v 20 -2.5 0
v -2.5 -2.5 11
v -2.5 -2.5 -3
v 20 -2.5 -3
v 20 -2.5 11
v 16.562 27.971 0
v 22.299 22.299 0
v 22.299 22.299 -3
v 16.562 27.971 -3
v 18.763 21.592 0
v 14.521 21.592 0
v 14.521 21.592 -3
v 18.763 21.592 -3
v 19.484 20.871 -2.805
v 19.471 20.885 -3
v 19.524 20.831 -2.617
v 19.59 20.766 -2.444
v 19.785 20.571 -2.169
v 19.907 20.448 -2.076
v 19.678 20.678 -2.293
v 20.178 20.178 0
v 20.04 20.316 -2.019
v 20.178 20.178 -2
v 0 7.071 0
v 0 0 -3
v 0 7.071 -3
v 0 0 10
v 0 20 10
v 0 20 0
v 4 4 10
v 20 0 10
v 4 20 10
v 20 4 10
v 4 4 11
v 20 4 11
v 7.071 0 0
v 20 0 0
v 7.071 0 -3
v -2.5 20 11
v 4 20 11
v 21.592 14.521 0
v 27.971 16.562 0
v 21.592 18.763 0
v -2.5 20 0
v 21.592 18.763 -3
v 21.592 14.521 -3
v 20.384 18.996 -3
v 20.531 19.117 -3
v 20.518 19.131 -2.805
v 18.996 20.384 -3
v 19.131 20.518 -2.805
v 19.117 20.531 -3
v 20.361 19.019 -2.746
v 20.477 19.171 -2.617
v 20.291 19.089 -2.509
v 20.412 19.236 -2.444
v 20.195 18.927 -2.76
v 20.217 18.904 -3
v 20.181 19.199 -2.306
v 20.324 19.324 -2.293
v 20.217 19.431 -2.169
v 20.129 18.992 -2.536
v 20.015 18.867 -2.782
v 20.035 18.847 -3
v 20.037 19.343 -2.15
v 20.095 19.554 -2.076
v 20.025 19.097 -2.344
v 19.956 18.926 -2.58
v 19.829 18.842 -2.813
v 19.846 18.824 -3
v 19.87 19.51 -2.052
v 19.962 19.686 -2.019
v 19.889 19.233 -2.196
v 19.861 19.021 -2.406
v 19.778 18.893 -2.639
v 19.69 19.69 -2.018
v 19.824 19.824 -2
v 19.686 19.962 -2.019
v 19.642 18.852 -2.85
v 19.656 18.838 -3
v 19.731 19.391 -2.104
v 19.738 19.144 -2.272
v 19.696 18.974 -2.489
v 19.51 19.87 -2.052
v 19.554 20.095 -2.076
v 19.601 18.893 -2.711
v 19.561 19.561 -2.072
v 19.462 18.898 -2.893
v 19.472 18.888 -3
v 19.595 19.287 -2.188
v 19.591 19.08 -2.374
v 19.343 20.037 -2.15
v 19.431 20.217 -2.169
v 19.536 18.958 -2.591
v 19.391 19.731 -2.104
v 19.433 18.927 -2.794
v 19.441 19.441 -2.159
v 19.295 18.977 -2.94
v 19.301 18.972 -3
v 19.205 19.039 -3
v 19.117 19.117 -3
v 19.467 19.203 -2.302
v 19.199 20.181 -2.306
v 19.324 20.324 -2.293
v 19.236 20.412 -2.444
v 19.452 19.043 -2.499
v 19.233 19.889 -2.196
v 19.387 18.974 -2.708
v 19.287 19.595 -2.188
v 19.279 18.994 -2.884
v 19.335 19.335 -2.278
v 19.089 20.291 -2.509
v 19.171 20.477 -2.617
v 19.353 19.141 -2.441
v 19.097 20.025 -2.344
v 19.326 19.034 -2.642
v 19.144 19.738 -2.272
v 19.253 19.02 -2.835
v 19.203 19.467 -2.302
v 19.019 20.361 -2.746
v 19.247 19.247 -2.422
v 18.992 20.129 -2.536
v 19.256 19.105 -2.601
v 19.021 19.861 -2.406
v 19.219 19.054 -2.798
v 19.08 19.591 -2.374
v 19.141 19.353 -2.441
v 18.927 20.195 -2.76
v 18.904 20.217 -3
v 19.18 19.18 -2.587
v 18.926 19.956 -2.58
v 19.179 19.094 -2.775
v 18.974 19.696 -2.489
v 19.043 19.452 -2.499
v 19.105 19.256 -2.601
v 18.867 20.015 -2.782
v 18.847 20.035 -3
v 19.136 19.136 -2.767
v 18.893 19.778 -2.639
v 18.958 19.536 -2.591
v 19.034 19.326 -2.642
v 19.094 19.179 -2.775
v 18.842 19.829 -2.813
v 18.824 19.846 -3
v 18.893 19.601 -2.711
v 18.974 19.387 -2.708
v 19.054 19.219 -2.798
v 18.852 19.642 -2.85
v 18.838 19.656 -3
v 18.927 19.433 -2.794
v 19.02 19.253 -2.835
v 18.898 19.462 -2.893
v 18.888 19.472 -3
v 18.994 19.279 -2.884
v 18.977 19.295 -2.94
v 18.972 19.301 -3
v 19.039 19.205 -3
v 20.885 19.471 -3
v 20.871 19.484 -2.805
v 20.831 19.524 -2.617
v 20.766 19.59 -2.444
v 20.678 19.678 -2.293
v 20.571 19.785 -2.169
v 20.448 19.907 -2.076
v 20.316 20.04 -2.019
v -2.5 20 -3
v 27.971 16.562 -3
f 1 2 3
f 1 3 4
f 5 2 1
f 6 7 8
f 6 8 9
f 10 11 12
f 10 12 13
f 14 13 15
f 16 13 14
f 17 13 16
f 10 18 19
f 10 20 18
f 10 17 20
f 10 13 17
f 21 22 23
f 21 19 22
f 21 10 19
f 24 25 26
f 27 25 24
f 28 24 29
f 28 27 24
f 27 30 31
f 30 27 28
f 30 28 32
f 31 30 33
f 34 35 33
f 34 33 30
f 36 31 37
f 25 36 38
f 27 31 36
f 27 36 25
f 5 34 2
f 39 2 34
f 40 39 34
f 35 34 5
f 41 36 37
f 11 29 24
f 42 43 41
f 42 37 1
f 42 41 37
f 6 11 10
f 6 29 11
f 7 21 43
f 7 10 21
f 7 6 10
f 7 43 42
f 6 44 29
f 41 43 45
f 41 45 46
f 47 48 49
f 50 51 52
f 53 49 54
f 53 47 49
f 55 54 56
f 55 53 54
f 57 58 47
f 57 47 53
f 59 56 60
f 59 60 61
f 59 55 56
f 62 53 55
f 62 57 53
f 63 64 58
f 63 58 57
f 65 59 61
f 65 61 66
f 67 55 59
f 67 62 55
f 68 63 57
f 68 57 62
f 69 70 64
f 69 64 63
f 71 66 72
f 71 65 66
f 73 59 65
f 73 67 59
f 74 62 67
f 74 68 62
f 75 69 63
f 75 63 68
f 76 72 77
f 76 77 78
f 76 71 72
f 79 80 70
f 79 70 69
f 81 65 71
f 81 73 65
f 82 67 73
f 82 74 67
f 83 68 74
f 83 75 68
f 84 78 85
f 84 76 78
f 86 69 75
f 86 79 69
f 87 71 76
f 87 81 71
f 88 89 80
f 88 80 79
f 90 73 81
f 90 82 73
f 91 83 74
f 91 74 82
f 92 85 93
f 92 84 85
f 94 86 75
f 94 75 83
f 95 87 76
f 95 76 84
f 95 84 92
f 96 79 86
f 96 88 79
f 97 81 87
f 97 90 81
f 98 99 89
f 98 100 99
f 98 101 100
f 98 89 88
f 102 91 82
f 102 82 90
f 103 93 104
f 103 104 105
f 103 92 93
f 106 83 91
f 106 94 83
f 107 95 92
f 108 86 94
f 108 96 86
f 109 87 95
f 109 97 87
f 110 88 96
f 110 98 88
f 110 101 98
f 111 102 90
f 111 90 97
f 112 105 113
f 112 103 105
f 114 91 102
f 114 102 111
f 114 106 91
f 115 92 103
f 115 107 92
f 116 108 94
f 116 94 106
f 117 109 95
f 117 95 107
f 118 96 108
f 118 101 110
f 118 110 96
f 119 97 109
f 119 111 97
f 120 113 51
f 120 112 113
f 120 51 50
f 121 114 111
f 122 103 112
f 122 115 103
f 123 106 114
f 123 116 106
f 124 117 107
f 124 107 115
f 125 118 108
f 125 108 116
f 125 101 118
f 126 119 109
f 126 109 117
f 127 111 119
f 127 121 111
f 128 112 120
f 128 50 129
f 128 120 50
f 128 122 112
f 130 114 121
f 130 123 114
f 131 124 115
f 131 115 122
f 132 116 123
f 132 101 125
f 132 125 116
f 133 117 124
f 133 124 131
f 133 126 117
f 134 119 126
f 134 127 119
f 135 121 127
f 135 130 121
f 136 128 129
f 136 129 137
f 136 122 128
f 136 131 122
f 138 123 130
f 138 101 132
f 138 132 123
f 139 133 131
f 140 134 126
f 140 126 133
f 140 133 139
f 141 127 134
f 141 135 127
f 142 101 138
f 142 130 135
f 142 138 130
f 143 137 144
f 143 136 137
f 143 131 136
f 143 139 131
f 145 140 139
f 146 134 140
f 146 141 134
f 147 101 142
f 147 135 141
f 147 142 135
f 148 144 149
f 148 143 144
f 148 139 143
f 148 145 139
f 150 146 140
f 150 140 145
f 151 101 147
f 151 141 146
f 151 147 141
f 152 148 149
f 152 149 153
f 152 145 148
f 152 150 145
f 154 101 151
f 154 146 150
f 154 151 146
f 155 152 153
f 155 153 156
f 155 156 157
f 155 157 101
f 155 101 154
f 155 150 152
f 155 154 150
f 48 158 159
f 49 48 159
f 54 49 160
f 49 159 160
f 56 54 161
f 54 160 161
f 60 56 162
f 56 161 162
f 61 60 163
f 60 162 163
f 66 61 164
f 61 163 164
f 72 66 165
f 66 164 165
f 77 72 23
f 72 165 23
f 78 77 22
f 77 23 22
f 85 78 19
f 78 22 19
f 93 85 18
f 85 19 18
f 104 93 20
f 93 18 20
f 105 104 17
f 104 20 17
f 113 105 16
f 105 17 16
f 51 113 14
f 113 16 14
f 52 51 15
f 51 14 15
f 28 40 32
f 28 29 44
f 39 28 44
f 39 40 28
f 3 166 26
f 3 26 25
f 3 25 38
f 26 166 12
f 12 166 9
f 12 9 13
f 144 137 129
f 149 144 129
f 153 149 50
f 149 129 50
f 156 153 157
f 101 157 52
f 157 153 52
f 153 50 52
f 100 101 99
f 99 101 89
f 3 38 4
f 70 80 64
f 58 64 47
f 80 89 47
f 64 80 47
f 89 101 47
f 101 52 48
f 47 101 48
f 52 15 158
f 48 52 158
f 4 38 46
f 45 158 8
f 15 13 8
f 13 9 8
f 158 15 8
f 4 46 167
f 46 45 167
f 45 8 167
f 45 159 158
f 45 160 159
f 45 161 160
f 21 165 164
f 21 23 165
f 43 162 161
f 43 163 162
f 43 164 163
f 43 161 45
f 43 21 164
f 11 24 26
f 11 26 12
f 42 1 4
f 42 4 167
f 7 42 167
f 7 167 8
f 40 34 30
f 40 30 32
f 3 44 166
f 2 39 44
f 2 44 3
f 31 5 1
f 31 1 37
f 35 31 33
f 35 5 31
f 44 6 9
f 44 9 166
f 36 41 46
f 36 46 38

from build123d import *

# Parameters (mm, degrees)
F2_DEPTH  = 7
F4_DEPTH  = 3
F5_DEPTH  = 7
F7_DEPTH  = 1.5
F8_R      = 0.99999
F10_DEPTH = 1


# Not quite as in the source:
# - a fillet or chamfer is up to 0.001 mm smaller than in the source, because OpenCascade refuses the exact size


with BuildPart() as f2:
    # F1 (on offset) → F2 (new body)
    with BuildSketch(Plane.XY.offset(4)):
        Polygon((20, 0), (0, 0), (0, 20), (-2.5, 20), (-2.5, -2.5), (20, -2.5), align=None)
    extrude(amount=F2_DEPTH)



with BuildPart() as f4:
    # F3 (on Top) → F4 (new body)
    with BuildSketch(Plane.XY):
        Polygon((21.591883092, 18.7634559673), (21.591883092, 14.5208152802), (4.5710678119, -2.5), (8.75, -2.5), (20, -2.5), (27.9713179916, 16.5624991059), (22.2989825486, 22.2989889792), (16.5624926754, 27.9713244222), (-2.5, 20), (-2.5, 8.75), (-2.5, 4.5710678119), (14.5208152802, 21.591883092), (18.7634559673, 21.591883092), (20.1776695297, 20.1776695297), align=None)
    extrude(amount=-F4_DEPTH)


with BuildPart() as f2_1:
    add(f2.part)

    add(f4.part)  # F5 merges F4
    # F1 (on offset) → F5 (join)
    with BuildSketch(Plane.XY.offset(4)):
        Polygon((20, 0), (0, 0), (0, 20), (-2.5, 20), (-2.5, -2.5), (20, -2.5), align=None)
    extrude(amount=-F5_DEPTH)

    # F6 (on face) → F7 (join)
    with BuildSketch(Plane(origin=(20.1776695297, 20.1776695297, 0), x_dir=(0.7071067812, -0.7071067812, 0), z_dir=(-0.7071067812, -0.7071067812, 0))):
        with BuildLine():
            Line((-1, -3), (1, -3))
            ThreePointArc((1, -3), (0, -2), (-1, -3))
        make_face()
    extrude(amount=F7_DEPTH)

    # F8 (radius 1 in the source; OpenCascade refuses exactly that, so slightly less here)
    f8_edges = [f2_1.edges().sort_by_distance(p)[0] for p in [
        (19.117009, 19.117009, -2),
    ]]
    fillet(f8_edges, radius=F8_R)

    # F9 (on face) → F10 (join)
    with BuildSketch(Plane.XY.offset(11)):
        Polygon((4, 20), (-2.5, 20), (-2.5, -2.5), (20, -2.5), (20, 4), (4, 4), align=None)
    extrude(amount=-F10_DEPTH)


solid = f2_1.part
